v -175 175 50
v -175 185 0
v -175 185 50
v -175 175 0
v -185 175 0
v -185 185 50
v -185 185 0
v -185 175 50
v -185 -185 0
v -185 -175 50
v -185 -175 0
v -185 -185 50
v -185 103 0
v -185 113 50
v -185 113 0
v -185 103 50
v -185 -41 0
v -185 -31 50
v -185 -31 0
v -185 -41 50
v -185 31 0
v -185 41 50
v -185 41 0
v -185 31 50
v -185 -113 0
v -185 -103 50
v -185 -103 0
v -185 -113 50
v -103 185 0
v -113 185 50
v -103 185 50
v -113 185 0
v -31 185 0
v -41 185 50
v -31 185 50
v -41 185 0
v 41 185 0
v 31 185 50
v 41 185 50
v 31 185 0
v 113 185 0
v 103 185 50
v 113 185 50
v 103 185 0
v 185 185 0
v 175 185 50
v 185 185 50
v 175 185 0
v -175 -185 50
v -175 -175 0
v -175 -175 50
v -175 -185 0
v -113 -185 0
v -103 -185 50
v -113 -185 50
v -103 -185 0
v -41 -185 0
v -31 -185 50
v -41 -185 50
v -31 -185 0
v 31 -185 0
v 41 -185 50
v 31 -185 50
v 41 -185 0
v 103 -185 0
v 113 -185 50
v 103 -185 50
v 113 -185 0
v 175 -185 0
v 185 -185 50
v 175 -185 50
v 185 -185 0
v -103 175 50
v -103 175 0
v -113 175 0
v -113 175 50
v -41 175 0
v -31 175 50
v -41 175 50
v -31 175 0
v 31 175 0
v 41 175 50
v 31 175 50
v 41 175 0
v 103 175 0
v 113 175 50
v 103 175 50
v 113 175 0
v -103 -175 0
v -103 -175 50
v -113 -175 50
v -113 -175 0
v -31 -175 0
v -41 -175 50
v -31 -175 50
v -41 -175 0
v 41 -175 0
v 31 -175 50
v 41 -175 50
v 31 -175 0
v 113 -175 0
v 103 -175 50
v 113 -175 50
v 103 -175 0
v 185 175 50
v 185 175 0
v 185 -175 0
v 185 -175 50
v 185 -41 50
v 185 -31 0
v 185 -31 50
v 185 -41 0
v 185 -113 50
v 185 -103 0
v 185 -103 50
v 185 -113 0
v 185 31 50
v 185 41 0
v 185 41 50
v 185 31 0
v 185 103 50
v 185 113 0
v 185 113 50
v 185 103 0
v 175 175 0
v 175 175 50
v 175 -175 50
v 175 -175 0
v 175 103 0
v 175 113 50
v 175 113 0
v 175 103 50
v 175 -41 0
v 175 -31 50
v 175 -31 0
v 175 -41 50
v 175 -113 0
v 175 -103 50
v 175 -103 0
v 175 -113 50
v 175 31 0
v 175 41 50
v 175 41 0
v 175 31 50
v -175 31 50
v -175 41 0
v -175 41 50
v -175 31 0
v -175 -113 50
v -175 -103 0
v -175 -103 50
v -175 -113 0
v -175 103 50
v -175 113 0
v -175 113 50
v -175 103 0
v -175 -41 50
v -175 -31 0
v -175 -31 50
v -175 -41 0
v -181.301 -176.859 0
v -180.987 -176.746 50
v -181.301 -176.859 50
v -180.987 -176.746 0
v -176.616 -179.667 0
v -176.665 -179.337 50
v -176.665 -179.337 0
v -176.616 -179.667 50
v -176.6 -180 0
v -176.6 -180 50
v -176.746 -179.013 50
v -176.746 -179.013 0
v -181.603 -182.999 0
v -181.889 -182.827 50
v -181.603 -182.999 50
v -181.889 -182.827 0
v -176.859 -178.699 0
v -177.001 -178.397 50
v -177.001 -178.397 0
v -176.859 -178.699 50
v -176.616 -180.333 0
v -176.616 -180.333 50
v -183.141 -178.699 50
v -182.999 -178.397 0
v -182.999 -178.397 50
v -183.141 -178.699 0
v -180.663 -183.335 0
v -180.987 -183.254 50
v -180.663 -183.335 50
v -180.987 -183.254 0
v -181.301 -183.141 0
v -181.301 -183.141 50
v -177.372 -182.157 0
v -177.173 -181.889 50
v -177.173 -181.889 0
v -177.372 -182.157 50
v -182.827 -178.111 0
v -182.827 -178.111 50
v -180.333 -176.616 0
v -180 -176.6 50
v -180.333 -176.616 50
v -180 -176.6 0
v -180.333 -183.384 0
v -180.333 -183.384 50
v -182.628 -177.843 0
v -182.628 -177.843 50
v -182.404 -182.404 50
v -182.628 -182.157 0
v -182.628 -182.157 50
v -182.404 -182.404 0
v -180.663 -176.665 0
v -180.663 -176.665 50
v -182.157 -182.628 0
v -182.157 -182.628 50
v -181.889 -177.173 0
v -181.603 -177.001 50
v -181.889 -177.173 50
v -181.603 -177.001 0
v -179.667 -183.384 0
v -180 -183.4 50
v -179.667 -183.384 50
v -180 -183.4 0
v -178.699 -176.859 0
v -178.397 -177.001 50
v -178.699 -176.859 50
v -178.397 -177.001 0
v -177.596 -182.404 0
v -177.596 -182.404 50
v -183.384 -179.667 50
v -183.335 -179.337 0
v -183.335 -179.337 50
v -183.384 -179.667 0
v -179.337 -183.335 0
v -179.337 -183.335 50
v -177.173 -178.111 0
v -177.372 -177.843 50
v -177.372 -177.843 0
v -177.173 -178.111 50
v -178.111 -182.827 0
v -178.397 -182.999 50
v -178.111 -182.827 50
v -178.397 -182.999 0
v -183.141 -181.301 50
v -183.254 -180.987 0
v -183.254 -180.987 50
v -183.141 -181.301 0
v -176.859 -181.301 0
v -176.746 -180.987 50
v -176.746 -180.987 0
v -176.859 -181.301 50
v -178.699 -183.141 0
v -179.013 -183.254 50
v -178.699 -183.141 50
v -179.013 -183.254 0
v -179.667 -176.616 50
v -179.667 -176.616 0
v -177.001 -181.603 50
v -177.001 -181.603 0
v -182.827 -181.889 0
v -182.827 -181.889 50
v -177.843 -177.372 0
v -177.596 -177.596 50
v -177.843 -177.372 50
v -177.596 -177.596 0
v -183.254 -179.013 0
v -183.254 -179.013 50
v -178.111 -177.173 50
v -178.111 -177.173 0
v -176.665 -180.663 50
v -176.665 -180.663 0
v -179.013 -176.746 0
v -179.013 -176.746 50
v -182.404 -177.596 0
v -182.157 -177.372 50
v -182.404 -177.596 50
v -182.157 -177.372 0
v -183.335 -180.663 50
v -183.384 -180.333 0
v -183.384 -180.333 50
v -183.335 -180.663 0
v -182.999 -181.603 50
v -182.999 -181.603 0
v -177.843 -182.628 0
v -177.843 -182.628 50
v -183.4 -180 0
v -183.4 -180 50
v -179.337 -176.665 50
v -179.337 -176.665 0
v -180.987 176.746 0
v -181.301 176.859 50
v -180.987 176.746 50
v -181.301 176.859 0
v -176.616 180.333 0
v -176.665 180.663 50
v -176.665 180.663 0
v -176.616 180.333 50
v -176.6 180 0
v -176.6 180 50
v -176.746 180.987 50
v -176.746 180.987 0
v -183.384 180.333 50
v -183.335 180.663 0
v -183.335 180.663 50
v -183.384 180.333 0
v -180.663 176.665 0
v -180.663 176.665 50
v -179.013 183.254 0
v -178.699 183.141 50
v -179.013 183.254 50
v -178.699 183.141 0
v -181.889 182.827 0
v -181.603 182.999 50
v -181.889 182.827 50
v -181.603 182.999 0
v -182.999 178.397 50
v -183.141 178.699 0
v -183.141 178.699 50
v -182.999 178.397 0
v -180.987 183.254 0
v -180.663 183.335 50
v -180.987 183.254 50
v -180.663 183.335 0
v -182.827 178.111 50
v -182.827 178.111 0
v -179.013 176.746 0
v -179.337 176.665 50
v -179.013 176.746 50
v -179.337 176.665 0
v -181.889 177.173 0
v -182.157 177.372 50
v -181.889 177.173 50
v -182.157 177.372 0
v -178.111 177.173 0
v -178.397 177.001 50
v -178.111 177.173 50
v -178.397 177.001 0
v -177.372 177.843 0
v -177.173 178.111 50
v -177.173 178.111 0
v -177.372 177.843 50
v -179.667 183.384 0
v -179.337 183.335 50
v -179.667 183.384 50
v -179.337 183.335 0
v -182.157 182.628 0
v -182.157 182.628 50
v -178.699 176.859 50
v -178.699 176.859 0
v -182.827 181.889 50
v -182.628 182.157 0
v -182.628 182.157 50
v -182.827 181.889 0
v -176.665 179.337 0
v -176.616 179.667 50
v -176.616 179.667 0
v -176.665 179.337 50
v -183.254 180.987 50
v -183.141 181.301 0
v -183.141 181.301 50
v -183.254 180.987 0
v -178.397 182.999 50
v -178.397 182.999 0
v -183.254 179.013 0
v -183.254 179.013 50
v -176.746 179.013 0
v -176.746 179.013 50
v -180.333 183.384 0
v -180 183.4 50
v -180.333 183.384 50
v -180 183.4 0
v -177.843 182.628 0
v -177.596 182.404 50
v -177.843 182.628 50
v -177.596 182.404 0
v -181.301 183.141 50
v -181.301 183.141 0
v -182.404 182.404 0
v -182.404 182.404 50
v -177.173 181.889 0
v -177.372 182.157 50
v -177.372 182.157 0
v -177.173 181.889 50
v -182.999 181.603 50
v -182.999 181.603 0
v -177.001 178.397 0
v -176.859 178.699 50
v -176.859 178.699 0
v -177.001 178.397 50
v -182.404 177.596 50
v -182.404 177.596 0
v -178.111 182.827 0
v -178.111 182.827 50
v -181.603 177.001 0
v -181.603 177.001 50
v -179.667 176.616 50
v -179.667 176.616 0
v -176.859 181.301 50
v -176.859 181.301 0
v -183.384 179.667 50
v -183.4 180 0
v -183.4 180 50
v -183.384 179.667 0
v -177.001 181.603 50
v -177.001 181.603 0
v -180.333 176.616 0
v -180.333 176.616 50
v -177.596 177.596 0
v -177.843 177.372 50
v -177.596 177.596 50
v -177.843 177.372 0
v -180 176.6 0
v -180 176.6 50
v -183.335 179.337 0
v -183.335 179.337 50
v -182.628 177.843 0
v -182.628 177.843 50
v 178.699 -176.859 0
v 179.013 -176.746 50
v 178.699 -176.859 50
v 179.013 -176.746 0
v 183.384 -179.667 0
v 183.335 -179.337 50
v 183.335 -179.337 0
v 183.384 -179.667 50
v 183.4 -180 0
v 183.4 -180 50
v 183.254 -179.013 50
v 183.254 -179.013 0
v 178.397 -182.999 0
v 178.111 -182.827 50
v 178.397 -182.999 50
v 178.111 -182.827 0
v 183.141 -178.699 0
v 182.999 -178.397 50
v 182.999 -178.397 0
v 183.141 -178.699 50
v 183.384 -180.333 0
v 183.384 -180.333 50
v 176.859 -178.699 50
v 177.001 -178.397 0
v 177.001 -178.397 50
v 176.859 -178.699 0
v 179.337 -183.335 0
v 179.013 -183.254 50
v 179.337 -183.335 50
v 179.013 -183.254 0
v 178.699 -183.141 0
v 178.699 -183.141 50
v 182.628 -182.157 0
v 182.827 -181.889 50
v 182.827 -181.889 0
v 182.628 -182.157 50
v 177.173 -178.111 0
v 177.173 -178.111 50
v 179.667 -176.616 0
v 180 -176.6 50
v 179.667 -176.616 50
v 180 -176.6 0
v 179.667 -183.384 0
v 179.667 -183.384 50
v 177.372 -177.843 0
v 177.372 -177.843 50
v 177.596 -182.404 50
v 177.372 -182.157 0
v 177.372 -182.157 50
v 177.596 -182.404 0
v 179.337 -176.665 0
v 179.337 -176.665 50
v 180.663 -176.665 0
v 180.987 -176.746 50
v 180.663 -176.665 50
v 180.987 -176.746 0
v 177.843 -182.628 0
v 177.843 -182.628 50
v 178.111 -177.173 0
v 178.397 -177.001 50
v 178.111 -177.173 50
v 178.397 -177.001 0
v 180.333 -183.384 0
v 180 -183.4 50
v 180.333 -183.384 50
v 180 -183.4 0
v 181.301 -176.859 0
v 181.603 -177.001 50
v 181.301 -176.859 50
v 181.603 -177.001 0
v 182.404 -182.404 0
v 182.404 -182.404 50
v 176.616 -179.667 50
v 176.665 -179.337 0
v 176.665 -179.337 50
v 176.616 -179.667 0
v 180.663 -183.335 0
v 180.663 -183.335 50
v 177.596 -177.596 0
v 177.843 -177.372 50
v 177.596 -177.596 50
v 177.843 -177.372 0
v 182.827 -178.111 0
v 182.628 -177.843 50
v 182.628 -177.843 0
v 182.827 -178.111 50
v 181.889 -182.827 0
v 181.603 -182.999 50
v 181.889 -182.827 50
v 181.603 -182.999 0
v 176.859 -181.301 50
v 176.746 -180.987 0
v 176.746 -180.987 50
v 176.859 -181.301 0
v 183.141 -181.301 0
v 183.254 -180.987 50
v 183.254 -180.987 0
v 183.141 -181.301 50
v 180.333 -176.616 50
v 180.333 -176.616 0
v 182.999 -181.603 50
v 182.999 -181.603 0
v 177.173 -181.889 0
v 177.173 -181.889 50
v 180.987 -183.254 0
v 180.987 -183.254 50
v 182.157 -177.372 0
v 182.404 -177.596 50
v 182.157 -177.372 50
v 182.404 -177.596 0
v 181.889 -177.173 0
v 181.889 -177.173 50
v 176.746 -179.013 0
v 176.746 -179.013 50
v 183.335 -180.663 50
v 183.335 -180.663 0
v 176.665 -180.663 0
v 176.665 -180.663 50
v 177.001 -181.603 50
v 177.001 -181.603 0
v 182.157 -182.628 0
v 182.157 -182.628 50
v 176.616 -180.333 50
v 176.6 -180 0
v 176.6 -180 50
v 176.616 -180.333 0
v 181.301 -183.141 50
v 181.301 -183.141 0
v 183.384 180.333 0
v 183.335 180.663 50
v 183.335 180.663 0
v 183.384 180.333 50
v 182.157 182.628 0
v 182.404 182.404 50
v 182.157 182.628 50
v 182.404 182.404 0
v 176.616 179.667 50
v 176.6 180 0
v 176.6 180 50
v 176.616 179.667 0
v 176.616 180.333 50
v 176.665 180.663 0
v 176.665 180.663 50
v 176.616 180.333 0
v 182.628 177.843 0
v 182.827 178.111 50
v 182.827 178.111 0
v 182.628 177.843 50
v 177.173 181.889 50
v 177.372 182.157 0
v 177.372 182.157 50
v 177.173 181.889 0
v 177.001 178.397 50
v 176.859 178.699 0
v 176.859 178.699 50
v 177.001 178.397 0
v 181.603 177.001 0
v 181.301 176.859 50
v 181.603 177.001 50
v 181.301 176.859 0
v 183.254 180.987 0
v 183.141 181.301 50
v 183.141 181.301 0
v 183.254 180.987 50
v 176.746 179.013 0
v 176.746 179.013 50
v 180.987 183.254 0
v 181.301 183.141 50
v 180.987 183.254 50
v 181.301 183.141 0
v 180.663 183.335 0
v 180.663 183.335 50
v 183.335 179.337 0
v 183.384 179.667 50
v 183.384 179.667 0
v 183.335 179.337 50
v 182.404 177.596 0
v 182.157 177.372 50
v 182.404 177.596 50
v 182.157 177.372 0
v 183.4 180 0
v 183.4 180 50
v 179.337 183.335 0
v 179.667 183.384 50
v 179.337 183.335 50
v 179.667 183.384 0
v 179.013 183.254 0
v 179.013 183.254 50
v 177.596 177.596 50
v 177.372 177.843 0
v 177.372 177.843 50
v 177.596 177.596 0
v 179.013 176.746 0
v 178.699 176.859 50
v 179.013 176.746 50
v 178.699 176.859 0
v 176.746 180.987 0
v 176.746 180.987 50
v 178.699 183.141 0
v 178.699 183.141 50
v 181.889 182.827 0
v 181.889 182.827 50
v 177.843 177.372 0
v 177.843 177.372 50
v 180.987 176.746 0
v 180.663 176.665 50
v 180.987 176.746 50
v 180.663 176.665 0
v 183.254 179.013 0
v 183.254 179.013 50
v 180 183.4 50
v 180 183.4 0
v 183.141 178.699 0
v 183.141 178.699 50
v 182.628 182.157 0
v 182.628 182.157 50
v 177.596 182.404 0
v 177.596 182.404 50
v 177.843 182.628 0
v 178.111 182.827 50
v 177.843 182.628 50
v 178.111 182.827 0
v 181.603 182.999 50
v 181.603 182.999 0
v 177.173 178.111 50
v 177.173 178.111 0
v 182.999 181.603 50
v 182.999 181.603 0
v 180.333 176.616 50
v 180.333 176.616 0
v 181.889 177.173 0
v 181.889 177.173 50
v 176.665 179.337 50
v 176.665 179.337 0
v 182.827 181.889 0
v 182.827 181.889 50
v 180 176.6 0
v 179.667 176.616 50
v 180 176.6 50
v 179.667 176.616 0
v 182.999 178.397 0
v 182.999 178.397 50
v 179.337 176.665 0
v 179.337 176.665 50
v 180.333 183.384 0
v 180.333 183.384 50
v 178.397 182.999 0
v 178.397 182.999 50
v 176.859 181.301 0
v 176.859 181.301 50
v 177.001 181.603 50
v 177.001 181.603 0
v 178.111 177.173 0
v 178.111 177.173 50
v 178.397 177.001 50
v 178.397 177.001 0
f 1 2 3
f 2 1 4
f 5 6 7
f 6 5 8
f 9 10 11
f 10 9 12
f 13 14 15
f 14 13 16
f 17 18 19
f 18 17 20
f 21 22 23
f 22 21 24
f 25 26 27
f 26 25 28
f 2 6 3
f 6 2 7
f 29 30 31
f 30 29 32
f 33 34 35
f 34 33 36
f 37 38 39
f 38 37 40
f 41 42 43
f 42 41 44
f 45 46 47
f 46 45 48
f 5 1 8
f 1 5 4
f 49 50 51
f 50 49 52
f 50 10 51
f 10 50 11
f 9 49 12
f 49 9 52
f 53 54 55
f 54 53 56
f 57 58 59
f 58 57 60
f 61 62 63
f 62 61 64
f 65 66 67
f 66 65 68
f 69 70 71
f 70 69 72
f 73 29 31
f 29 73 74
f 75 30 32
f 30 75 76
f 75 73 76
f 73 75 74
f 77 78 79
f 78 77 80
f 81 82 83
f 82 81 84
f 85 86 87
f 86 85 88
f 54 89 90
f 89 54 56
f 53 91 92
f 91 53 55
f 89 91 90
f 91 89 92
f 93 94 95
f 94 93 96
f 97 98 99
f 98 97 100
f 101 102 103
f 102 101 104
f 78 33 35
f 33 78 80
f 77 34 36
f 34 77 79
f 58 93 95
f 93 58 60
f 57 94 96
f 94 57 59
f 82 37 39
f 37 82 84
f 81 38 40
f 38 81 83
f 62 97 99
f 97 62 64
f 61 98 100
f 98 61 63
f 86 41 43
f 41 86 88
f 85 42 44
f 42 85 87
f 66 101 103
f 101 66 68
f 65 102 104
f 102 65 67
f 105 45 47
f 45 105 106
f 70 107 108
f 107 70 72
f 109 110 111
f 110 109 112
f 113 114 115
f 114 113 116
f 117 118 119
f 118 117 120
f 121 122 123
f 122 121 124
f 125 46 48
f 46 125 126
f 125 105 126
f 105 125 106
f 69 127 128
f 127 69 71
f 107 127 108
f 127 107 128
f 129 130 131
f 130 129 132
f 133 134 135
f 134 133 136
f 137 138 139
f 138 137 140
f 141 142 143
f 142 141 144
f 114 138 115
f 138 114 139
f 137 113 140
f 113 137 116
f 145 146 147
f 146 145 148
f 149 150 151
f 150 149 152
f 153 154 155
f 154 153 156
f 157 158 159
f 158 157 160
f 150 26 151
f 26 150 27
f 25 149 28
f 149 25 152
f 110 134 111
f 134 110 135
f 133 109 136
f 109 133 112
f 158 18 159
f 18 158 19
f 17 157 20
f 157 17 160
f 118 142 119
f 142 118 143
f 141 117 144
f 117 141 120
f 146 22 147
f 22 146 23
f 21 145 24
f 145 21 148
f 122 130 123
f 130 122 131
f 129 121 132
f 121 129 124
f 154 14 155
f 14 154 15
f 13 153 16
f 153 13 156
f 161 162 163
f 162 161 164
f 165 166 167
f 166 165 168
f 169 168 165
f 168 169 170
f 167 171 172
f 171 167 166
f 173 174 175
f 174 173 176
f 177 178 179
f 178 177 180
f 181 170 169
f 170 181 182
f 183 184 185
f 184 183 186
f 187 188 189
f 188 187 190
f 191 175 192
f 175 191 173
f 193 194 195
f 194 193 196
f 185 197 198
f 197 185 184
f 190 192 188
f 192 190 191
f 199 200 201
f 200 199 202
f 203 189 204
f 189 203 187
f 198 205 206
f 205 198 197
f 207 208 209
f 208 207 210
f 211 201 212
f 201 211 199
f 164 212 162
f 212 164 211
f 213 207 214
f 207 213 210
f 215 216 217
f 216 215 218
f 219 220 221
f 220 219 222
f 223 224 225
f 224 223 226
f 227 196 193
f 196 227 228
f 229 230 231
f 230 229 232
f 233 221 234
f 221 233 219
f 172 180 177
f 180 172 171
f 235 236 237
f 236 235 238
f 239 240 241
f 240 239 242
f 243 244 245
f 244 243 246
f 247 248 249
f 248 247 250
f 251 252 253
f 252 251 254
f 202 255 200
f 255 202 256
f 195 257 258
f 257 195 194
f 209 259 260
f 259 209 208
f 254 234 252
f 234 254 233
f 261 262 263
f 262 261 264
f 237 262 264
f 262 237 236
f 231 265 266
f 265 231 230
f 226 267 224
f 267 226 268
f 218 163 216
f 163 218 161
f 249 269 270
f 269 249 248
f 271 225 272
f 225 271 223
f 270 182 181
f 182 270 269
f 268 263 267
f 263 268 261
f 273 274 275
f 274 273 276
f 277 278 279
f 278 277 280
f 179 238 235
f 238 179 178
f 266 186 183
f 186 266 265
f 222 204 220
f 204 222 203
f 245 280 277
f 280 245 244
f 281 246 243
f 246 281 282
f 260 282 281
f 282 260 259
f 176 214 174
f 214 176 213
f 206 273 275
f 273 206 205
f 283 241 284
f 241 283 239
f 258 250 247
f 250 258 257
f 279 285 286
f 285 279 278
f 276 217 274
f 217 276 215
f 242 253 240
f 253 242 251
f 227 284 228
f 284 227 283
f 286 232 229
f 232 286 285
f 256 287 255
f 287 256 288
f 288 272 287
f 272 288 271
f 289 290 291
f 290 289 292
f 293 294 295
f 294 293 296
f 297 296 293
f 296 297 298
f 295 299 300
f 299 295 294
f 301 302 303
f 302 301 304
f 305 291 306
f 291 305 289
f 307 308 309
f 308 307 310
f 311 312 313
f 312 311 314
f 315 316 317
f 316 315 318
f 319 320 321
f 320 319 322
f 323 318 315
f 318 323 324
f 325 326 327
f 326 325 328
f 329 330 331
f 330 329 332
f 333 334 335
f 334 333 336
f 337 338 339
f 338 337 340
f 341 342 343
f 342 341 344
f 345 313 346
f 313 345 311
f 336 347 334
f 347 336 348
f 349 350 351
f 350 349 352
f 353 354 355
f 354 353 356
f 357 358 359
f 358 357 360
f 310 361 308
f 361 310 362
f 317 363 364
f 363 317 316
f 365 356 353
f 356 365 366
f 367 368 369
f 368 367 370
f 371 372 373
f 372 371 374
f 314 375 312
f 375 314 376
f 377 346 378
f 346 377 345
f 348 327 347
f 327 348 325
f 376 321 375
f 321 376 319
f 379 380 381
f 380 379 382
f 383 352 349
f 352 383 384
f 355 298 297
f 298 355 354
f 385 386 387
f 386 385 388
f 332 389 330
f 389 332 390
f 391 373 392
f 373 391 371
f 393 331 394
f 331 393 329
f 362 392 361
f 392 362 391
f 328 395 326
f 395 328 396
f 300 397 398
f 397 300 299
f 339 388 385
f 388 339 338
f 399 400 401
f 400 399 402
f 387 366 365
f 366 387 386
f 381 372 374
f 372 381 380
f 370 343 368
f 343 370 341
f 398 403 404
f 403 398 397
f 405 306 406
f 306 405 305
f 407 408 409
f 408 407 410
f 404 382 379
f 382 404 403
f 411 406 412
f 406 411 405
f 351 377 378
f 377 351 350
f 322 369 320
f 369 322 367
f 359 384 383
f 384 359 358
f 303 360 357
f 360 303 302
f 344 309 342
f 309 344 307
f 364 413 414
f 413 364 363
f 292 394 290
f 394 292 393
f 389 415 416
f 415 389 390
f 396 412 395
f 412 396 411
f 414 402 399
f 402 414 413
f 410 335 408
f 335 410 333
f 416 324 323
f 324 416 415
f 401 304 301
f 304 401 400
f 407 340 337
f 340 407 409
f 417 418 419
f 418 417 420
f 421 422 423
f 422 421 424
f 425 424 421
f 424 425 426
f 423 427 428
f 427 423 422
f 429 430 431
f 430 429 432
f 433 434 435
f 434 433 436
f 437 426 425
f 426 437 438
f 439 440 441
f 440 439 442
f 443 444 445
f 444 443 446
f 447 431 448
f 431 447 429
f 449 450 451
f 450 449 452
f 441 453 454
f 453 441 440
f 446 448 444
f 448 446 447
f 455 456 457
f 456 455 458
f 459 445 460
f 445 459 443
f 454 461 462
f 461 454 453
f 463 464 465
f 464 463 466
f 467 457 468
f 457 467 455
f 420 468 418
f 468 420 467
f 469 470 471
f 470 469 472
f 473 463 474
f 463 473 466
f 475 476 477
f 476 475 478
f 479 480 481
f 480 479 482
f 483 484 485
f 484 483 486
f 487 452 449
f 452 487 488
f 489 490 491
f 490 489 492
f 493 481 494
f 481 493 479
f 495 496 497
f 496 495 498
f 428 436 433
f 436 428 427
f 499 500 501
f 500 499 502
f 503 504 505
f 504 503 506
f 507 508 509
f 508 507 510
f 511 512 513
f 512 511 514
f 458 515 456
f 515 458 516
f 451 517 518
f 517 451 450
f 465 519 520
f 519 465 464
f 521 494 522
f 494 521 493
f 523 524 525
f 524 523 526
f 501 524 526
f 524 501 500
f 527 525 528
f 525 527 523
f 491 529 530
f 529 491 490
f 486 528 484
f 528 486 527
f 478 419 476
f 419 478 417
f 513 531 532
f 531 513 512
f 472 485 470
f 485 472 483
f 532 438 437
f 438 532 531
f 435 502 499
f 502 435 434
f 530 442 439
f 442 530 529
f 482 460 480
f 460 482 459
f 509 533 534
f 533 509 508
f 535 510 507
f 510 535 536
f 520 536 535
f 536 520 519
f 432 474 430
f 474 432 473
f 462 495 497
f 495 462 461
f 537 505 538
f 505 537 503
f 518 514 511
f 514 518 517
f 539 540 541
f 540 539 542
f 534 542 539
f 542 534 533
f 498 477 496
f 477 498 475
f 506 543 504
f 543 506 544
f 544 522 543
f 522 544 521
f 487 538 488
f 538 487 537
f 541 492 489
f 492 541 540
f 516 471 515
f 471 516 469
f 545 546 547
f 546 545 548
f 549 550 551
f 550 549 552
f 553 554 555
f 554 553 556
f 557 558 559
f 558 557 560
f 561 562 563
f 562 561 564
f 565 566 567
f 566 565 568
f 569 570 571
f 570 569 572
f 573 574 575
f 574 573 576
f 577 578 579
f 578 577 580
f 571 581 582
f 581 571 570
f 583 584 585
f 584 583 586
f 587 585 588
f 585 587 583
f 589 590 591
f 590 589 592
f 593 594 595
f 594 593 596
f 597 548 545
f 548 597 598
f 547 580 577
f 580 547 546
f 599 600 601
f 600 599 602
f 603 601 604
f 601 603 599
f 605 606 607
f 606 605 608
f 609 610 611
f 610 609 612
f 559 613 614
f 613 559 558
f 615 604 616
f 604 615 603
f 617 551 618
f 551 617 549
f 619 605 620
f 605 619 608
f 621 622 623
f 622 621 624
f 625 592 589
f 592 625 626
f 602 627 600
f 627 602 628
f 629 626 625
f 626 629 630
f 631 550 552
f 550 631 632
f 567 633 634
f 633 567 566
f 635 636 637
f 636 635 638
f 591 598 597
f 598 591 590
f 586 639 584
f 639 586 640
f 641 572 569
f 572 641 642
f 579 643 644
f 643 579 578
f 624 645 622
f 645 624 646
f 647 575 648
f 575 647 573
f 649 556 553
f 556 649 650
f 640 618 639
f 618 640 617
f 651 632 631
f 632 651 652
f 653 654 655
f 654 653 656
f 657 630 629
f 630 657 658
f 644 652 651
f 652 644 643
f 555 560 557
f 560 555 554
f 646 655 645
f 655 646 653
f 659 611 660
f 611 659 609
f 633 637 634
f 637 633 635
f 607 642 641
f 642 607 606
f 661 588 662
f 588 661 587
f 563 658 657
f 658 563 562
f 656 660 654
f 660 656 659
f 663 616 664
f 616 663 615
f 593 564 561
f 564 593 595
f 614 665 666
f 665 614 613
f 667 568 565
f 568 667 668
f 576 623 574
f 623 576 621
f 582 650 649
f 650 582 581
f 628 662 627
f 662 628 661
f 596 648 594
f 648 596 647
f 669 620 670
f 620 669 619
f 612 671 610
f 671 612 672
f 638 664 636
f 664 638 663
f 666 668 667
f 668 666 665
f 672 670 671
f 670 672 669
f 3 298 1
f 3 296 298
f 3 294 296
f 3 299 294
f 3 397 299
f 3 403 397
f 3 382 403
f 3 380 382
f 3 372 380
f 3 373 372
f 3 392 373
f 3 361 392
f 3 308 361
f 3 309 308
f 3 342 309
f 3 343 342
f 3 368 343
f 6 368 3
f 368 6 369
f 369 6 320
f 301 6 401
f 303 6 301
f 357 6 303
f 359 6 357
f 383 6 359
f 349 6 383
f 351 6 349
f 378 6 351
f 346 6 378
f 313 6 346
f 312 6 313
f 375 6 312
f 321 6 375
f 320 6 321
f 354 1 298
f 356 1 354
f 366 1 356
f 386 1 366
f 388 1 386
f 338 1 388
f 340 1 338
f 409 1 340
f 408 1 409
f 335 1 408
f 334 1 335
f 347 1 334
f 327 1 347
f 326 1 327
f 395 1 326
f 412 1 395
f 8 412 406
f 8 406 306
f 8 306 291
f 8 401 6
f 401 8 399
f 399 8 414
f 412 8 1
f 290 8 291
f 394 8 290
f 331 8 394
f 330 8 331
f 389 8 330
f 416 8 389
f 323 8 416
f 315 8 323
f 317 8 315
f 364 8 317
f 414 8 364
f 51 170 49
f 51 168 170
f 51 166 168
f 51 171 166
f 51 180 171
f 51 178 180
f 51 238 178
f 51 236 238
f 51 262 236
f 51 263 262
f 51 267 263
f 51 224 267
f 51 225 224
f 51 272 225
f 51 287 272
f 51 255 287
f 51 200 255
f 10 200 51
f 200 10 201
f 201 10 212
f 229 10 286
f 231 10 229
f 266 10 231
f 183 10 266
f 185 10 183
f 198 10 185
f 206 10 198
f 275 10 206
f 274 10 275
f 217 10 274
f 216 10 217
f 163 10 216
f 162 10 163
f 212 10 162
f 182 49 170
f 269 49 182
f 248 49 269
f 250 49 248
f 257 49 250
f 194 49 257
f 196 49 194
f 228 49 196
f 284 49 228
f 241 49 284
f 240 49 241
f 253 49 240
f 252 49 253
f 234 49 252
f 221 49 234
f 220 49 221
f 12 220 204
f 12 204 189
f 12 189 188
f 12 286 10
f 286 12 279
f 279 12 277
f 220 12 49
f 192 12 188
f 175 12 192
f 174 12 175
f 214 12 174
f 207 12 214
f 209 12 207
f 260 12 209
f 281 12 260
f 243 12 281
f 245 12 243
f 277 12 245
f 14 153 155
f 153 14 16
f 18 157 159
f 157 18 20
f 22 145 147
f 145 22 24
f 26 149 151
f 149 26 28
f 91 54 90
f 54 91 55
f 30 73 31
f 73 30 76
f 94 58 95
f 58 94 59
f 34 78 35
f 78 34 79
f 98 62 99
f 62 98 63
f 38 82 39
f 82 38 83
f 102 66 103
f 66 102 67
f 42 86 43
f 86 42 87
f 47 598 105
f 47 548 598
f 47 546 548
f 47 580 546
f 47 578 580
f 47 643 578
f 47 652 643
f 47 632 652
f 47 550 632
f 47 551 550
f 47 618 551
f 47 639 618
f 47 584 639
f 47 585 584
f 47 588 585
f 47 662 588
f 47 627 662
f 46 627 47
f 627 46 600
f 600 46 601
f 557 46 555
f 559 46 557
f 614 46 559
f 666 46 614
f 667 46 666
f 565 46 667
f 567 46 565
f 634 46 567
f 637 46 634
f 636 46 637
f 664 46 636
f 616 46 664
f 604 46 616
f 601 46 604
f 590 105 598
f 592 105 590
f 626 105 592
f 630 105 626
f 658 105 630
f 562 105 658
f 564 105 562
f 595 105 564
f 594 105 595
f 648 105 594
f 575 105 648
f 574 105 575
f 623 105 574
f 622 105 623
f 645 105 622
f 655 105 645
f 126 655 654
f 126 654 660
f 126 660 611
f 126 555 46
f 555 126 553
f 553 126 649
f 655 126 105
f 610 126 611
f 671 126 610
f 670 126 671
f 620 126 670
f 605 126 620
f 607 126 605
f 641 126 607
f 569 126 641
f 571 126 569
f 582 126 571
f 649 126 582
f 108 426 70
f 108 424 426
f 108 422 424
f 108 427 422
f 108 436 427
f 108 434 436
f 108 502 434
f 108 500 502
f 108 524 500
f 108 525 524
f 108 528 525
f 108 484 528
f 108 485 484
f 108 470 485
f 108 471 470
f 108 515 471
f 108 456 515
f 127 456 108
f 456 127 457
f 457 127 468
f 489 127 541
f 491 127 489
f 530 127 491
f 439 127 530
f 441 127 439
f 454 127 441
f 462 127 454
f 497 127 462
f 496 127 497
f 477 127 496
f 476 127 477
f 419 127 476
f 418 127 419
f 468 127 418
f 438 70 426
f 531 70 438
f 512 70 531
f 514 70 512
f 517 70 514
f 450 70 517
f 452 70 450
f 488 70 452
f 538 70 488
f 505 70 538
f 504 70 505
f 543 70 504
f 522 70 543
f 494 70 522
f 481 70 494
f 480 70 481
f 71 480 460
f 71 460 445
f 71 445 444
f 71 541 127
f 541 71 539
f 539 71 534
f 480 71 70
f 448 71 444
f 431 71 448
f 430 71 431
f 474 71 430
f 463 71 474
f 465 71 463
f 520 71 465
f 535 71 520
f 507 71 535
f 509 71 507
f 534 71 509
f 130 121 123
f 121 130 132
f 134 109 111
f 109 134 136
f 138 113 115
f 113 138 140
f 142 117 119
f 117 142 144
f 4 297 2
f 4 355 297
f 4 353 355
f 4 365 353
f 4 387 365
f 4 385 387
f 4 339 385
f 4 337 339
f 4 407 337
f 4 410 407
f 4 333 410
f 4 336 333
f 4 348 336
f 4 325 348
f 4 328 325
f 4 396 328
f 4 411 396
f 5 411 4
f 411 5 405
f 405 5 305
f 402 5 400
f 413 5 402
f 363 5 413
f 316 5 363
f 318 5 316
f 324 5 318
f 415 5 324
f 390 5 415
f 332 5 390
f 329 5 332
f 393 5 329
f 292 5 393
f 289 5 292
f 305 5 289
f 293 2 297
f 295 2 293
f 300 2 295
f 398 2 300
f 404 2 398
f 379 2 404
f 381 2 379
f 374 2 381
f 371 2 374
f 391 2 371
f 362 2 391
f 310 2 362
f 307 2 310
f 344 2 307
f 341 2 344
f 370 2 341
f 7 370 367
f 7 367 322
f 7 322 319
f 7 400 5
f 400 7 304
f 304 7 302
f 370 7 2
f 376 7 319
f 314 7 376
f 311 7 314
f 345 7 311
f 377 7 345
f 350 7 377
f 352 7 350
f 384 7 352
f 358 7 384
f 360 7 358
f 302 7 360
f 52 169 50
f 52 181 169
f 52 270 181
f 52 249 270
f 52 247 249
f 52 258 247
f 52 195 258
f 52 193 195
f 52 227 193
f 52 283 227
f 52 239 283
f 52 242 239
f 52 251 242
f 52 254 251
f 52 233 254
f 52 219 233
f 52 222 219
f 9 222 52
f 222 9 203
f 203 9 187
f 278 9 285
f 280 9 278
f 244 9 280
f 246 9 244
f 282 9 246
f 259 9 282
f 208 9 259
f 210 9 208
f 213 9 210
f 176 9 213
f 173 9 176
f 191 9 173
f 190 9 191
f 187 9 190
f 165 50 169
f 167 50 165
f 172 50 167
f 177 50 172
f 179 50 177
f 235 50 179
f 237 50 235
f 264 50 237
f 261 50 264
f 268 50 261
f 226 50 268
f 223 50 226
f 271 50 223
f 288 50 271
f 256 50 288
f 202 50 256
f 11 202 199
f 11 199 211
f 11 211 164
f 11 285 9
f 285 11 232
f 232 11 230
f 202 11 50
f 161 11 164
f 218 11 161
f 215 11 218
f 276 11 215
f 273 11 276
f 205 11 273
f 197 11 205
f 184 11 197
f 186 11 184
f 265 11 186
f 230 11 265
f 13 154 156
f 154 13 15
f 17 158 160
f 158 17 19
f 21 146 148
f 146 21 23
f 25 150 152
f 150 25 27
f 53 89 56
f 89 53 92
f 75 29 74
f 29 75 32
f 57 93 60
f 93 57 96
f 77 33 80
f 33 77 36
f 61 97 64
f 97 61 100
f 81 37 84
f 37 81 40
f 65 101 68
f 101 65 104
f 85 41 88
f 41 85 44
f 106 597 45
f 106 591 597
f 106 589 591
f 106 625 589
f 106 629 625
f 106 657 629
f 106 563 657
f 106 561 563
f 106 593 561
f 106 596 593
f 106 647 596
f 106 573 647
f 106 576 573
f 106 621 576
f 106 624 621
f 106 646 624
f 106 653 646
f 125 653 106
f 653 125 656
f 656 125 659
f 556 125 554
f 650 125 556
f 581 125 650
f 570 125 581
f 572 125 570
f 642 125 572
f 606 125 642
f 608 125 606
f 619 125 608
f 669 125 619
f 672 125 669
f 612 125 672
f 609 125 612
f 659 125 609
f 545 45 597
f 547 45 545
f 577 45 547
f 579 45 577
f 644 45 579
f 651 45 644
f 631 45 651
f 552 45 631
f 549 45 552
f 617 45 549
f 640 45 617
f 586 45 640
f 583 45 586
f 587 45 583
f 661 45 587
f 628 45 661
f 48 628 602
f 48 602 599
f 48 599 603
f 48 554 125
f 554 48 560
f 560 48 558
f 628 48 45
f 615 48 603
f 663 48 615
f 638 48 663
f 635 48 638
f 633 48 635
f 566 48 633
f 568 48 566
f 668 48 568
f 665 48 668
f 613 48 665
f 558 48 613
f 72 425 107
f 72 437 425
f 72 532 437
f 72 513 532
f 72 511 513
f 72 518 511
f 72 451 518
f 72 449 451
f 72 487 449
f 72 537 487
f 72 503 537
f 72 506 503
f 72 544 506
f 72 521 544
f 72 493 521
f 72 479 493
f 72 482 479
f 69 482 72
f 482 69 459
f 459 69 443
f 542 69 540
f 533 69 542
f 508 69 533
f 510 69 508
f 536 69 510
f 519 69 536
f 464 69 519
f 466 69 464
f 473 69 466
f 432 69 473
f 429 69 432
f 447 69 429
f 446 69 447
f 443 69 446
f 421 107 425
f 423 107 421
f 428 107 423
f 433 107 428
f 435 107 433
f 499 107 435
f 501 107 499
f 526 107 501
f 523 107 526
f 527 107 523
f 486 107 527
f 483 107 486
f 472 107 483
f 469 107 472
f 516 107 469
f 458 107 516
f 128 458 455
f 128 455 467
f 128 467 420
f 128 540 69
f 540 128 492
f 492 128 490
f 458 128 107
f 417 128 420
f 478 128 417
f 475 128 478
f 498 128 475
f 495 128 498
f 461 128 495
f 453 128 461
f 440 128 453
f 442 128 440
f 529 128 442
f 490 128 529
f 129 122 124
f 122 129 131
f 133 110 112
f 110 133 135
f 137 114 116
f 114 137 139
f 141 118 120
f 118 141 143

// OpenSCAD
// Cage slice part (z0..z1). Units: mm.
// Print orientation: normal

bar=10;
inner=[350,350,700];
gap_xy=62;
gap_z=61;
hole_d=6.8;
$fn=64;

outer=[inner[0]+2*bar, inner[1]+2*bar, inner[2]+2*bar];
half=[outer[0]/2, outer[1]/2, outer[2]/2];

pitch_xy=bar+gap_xy;
pitch_z=bar+gap_z;

centers=[for(i=[0:5]) -(half[0]-bar/2) + i*pitch_xy];
z_levels=[for(i=[0:10]) i*pitch_z];

module vbar(xc,yc){ translate([xc-bar/2,yc-bar/2,0]) cube([bar,bar,outer[2]],center=false); }
module hbar_x(yc,z0){ translate([-half[0],yc-bar/2,z0]) cube([outer[0],bar,bar],center=false); }
module hbar_y(xc,z0){ translate([xc-bar/2,-half[1],z0]) cube([bar,outer[1],bar],center=false); }

module grid(z0){ union(){ for(yc=centers) hbar_x(yc,z0); for(xc=centers) hbar_y(xc,z0); } }

module side_verticals(){
  union(){
    for(xc=centers){ vbar(xc, half[1]-bar/2); vbar(xc,-half[1]+bar/2); }
    for(yc=centers){ vbar( half[0]-bar/2,yc); vbar(-half[0]+bar/2,yc); }
  }
}

module side_rings(){
  union(){
    for(z0=z_levels){
      hbar_x( half[1]-bar/2,z0); hbar_x(-half[1]+bar/2,z0);
      hbar_y( half[0]-bar/2,z0); hbar_y(-half[0]+bar/2,z0);
    }
  }
}

module rod_holes(){
  for(sx=[-1,1],sy=[-1,1]) translate([sx*(half[0]-bar/2), sy*(half[1]-bar/2), -1]) cylinder(d=hole_d,h=outer[2]+2,center=false);
}

module cage(){ difference(){ union(){ side_verticals(); side_rings(); grid(0); grid(outer[2]-bar); } rod_holes(); } }

module cage_slice(zmin,zmax){ intersection(){ cage(); translate([-1000,-1000,zmin]) cube([2000,2000,zmax-zmin],center=false); } }

z0=297; z1=347;
translate([0,0,-z0]) cage_slice(z0,z1);
